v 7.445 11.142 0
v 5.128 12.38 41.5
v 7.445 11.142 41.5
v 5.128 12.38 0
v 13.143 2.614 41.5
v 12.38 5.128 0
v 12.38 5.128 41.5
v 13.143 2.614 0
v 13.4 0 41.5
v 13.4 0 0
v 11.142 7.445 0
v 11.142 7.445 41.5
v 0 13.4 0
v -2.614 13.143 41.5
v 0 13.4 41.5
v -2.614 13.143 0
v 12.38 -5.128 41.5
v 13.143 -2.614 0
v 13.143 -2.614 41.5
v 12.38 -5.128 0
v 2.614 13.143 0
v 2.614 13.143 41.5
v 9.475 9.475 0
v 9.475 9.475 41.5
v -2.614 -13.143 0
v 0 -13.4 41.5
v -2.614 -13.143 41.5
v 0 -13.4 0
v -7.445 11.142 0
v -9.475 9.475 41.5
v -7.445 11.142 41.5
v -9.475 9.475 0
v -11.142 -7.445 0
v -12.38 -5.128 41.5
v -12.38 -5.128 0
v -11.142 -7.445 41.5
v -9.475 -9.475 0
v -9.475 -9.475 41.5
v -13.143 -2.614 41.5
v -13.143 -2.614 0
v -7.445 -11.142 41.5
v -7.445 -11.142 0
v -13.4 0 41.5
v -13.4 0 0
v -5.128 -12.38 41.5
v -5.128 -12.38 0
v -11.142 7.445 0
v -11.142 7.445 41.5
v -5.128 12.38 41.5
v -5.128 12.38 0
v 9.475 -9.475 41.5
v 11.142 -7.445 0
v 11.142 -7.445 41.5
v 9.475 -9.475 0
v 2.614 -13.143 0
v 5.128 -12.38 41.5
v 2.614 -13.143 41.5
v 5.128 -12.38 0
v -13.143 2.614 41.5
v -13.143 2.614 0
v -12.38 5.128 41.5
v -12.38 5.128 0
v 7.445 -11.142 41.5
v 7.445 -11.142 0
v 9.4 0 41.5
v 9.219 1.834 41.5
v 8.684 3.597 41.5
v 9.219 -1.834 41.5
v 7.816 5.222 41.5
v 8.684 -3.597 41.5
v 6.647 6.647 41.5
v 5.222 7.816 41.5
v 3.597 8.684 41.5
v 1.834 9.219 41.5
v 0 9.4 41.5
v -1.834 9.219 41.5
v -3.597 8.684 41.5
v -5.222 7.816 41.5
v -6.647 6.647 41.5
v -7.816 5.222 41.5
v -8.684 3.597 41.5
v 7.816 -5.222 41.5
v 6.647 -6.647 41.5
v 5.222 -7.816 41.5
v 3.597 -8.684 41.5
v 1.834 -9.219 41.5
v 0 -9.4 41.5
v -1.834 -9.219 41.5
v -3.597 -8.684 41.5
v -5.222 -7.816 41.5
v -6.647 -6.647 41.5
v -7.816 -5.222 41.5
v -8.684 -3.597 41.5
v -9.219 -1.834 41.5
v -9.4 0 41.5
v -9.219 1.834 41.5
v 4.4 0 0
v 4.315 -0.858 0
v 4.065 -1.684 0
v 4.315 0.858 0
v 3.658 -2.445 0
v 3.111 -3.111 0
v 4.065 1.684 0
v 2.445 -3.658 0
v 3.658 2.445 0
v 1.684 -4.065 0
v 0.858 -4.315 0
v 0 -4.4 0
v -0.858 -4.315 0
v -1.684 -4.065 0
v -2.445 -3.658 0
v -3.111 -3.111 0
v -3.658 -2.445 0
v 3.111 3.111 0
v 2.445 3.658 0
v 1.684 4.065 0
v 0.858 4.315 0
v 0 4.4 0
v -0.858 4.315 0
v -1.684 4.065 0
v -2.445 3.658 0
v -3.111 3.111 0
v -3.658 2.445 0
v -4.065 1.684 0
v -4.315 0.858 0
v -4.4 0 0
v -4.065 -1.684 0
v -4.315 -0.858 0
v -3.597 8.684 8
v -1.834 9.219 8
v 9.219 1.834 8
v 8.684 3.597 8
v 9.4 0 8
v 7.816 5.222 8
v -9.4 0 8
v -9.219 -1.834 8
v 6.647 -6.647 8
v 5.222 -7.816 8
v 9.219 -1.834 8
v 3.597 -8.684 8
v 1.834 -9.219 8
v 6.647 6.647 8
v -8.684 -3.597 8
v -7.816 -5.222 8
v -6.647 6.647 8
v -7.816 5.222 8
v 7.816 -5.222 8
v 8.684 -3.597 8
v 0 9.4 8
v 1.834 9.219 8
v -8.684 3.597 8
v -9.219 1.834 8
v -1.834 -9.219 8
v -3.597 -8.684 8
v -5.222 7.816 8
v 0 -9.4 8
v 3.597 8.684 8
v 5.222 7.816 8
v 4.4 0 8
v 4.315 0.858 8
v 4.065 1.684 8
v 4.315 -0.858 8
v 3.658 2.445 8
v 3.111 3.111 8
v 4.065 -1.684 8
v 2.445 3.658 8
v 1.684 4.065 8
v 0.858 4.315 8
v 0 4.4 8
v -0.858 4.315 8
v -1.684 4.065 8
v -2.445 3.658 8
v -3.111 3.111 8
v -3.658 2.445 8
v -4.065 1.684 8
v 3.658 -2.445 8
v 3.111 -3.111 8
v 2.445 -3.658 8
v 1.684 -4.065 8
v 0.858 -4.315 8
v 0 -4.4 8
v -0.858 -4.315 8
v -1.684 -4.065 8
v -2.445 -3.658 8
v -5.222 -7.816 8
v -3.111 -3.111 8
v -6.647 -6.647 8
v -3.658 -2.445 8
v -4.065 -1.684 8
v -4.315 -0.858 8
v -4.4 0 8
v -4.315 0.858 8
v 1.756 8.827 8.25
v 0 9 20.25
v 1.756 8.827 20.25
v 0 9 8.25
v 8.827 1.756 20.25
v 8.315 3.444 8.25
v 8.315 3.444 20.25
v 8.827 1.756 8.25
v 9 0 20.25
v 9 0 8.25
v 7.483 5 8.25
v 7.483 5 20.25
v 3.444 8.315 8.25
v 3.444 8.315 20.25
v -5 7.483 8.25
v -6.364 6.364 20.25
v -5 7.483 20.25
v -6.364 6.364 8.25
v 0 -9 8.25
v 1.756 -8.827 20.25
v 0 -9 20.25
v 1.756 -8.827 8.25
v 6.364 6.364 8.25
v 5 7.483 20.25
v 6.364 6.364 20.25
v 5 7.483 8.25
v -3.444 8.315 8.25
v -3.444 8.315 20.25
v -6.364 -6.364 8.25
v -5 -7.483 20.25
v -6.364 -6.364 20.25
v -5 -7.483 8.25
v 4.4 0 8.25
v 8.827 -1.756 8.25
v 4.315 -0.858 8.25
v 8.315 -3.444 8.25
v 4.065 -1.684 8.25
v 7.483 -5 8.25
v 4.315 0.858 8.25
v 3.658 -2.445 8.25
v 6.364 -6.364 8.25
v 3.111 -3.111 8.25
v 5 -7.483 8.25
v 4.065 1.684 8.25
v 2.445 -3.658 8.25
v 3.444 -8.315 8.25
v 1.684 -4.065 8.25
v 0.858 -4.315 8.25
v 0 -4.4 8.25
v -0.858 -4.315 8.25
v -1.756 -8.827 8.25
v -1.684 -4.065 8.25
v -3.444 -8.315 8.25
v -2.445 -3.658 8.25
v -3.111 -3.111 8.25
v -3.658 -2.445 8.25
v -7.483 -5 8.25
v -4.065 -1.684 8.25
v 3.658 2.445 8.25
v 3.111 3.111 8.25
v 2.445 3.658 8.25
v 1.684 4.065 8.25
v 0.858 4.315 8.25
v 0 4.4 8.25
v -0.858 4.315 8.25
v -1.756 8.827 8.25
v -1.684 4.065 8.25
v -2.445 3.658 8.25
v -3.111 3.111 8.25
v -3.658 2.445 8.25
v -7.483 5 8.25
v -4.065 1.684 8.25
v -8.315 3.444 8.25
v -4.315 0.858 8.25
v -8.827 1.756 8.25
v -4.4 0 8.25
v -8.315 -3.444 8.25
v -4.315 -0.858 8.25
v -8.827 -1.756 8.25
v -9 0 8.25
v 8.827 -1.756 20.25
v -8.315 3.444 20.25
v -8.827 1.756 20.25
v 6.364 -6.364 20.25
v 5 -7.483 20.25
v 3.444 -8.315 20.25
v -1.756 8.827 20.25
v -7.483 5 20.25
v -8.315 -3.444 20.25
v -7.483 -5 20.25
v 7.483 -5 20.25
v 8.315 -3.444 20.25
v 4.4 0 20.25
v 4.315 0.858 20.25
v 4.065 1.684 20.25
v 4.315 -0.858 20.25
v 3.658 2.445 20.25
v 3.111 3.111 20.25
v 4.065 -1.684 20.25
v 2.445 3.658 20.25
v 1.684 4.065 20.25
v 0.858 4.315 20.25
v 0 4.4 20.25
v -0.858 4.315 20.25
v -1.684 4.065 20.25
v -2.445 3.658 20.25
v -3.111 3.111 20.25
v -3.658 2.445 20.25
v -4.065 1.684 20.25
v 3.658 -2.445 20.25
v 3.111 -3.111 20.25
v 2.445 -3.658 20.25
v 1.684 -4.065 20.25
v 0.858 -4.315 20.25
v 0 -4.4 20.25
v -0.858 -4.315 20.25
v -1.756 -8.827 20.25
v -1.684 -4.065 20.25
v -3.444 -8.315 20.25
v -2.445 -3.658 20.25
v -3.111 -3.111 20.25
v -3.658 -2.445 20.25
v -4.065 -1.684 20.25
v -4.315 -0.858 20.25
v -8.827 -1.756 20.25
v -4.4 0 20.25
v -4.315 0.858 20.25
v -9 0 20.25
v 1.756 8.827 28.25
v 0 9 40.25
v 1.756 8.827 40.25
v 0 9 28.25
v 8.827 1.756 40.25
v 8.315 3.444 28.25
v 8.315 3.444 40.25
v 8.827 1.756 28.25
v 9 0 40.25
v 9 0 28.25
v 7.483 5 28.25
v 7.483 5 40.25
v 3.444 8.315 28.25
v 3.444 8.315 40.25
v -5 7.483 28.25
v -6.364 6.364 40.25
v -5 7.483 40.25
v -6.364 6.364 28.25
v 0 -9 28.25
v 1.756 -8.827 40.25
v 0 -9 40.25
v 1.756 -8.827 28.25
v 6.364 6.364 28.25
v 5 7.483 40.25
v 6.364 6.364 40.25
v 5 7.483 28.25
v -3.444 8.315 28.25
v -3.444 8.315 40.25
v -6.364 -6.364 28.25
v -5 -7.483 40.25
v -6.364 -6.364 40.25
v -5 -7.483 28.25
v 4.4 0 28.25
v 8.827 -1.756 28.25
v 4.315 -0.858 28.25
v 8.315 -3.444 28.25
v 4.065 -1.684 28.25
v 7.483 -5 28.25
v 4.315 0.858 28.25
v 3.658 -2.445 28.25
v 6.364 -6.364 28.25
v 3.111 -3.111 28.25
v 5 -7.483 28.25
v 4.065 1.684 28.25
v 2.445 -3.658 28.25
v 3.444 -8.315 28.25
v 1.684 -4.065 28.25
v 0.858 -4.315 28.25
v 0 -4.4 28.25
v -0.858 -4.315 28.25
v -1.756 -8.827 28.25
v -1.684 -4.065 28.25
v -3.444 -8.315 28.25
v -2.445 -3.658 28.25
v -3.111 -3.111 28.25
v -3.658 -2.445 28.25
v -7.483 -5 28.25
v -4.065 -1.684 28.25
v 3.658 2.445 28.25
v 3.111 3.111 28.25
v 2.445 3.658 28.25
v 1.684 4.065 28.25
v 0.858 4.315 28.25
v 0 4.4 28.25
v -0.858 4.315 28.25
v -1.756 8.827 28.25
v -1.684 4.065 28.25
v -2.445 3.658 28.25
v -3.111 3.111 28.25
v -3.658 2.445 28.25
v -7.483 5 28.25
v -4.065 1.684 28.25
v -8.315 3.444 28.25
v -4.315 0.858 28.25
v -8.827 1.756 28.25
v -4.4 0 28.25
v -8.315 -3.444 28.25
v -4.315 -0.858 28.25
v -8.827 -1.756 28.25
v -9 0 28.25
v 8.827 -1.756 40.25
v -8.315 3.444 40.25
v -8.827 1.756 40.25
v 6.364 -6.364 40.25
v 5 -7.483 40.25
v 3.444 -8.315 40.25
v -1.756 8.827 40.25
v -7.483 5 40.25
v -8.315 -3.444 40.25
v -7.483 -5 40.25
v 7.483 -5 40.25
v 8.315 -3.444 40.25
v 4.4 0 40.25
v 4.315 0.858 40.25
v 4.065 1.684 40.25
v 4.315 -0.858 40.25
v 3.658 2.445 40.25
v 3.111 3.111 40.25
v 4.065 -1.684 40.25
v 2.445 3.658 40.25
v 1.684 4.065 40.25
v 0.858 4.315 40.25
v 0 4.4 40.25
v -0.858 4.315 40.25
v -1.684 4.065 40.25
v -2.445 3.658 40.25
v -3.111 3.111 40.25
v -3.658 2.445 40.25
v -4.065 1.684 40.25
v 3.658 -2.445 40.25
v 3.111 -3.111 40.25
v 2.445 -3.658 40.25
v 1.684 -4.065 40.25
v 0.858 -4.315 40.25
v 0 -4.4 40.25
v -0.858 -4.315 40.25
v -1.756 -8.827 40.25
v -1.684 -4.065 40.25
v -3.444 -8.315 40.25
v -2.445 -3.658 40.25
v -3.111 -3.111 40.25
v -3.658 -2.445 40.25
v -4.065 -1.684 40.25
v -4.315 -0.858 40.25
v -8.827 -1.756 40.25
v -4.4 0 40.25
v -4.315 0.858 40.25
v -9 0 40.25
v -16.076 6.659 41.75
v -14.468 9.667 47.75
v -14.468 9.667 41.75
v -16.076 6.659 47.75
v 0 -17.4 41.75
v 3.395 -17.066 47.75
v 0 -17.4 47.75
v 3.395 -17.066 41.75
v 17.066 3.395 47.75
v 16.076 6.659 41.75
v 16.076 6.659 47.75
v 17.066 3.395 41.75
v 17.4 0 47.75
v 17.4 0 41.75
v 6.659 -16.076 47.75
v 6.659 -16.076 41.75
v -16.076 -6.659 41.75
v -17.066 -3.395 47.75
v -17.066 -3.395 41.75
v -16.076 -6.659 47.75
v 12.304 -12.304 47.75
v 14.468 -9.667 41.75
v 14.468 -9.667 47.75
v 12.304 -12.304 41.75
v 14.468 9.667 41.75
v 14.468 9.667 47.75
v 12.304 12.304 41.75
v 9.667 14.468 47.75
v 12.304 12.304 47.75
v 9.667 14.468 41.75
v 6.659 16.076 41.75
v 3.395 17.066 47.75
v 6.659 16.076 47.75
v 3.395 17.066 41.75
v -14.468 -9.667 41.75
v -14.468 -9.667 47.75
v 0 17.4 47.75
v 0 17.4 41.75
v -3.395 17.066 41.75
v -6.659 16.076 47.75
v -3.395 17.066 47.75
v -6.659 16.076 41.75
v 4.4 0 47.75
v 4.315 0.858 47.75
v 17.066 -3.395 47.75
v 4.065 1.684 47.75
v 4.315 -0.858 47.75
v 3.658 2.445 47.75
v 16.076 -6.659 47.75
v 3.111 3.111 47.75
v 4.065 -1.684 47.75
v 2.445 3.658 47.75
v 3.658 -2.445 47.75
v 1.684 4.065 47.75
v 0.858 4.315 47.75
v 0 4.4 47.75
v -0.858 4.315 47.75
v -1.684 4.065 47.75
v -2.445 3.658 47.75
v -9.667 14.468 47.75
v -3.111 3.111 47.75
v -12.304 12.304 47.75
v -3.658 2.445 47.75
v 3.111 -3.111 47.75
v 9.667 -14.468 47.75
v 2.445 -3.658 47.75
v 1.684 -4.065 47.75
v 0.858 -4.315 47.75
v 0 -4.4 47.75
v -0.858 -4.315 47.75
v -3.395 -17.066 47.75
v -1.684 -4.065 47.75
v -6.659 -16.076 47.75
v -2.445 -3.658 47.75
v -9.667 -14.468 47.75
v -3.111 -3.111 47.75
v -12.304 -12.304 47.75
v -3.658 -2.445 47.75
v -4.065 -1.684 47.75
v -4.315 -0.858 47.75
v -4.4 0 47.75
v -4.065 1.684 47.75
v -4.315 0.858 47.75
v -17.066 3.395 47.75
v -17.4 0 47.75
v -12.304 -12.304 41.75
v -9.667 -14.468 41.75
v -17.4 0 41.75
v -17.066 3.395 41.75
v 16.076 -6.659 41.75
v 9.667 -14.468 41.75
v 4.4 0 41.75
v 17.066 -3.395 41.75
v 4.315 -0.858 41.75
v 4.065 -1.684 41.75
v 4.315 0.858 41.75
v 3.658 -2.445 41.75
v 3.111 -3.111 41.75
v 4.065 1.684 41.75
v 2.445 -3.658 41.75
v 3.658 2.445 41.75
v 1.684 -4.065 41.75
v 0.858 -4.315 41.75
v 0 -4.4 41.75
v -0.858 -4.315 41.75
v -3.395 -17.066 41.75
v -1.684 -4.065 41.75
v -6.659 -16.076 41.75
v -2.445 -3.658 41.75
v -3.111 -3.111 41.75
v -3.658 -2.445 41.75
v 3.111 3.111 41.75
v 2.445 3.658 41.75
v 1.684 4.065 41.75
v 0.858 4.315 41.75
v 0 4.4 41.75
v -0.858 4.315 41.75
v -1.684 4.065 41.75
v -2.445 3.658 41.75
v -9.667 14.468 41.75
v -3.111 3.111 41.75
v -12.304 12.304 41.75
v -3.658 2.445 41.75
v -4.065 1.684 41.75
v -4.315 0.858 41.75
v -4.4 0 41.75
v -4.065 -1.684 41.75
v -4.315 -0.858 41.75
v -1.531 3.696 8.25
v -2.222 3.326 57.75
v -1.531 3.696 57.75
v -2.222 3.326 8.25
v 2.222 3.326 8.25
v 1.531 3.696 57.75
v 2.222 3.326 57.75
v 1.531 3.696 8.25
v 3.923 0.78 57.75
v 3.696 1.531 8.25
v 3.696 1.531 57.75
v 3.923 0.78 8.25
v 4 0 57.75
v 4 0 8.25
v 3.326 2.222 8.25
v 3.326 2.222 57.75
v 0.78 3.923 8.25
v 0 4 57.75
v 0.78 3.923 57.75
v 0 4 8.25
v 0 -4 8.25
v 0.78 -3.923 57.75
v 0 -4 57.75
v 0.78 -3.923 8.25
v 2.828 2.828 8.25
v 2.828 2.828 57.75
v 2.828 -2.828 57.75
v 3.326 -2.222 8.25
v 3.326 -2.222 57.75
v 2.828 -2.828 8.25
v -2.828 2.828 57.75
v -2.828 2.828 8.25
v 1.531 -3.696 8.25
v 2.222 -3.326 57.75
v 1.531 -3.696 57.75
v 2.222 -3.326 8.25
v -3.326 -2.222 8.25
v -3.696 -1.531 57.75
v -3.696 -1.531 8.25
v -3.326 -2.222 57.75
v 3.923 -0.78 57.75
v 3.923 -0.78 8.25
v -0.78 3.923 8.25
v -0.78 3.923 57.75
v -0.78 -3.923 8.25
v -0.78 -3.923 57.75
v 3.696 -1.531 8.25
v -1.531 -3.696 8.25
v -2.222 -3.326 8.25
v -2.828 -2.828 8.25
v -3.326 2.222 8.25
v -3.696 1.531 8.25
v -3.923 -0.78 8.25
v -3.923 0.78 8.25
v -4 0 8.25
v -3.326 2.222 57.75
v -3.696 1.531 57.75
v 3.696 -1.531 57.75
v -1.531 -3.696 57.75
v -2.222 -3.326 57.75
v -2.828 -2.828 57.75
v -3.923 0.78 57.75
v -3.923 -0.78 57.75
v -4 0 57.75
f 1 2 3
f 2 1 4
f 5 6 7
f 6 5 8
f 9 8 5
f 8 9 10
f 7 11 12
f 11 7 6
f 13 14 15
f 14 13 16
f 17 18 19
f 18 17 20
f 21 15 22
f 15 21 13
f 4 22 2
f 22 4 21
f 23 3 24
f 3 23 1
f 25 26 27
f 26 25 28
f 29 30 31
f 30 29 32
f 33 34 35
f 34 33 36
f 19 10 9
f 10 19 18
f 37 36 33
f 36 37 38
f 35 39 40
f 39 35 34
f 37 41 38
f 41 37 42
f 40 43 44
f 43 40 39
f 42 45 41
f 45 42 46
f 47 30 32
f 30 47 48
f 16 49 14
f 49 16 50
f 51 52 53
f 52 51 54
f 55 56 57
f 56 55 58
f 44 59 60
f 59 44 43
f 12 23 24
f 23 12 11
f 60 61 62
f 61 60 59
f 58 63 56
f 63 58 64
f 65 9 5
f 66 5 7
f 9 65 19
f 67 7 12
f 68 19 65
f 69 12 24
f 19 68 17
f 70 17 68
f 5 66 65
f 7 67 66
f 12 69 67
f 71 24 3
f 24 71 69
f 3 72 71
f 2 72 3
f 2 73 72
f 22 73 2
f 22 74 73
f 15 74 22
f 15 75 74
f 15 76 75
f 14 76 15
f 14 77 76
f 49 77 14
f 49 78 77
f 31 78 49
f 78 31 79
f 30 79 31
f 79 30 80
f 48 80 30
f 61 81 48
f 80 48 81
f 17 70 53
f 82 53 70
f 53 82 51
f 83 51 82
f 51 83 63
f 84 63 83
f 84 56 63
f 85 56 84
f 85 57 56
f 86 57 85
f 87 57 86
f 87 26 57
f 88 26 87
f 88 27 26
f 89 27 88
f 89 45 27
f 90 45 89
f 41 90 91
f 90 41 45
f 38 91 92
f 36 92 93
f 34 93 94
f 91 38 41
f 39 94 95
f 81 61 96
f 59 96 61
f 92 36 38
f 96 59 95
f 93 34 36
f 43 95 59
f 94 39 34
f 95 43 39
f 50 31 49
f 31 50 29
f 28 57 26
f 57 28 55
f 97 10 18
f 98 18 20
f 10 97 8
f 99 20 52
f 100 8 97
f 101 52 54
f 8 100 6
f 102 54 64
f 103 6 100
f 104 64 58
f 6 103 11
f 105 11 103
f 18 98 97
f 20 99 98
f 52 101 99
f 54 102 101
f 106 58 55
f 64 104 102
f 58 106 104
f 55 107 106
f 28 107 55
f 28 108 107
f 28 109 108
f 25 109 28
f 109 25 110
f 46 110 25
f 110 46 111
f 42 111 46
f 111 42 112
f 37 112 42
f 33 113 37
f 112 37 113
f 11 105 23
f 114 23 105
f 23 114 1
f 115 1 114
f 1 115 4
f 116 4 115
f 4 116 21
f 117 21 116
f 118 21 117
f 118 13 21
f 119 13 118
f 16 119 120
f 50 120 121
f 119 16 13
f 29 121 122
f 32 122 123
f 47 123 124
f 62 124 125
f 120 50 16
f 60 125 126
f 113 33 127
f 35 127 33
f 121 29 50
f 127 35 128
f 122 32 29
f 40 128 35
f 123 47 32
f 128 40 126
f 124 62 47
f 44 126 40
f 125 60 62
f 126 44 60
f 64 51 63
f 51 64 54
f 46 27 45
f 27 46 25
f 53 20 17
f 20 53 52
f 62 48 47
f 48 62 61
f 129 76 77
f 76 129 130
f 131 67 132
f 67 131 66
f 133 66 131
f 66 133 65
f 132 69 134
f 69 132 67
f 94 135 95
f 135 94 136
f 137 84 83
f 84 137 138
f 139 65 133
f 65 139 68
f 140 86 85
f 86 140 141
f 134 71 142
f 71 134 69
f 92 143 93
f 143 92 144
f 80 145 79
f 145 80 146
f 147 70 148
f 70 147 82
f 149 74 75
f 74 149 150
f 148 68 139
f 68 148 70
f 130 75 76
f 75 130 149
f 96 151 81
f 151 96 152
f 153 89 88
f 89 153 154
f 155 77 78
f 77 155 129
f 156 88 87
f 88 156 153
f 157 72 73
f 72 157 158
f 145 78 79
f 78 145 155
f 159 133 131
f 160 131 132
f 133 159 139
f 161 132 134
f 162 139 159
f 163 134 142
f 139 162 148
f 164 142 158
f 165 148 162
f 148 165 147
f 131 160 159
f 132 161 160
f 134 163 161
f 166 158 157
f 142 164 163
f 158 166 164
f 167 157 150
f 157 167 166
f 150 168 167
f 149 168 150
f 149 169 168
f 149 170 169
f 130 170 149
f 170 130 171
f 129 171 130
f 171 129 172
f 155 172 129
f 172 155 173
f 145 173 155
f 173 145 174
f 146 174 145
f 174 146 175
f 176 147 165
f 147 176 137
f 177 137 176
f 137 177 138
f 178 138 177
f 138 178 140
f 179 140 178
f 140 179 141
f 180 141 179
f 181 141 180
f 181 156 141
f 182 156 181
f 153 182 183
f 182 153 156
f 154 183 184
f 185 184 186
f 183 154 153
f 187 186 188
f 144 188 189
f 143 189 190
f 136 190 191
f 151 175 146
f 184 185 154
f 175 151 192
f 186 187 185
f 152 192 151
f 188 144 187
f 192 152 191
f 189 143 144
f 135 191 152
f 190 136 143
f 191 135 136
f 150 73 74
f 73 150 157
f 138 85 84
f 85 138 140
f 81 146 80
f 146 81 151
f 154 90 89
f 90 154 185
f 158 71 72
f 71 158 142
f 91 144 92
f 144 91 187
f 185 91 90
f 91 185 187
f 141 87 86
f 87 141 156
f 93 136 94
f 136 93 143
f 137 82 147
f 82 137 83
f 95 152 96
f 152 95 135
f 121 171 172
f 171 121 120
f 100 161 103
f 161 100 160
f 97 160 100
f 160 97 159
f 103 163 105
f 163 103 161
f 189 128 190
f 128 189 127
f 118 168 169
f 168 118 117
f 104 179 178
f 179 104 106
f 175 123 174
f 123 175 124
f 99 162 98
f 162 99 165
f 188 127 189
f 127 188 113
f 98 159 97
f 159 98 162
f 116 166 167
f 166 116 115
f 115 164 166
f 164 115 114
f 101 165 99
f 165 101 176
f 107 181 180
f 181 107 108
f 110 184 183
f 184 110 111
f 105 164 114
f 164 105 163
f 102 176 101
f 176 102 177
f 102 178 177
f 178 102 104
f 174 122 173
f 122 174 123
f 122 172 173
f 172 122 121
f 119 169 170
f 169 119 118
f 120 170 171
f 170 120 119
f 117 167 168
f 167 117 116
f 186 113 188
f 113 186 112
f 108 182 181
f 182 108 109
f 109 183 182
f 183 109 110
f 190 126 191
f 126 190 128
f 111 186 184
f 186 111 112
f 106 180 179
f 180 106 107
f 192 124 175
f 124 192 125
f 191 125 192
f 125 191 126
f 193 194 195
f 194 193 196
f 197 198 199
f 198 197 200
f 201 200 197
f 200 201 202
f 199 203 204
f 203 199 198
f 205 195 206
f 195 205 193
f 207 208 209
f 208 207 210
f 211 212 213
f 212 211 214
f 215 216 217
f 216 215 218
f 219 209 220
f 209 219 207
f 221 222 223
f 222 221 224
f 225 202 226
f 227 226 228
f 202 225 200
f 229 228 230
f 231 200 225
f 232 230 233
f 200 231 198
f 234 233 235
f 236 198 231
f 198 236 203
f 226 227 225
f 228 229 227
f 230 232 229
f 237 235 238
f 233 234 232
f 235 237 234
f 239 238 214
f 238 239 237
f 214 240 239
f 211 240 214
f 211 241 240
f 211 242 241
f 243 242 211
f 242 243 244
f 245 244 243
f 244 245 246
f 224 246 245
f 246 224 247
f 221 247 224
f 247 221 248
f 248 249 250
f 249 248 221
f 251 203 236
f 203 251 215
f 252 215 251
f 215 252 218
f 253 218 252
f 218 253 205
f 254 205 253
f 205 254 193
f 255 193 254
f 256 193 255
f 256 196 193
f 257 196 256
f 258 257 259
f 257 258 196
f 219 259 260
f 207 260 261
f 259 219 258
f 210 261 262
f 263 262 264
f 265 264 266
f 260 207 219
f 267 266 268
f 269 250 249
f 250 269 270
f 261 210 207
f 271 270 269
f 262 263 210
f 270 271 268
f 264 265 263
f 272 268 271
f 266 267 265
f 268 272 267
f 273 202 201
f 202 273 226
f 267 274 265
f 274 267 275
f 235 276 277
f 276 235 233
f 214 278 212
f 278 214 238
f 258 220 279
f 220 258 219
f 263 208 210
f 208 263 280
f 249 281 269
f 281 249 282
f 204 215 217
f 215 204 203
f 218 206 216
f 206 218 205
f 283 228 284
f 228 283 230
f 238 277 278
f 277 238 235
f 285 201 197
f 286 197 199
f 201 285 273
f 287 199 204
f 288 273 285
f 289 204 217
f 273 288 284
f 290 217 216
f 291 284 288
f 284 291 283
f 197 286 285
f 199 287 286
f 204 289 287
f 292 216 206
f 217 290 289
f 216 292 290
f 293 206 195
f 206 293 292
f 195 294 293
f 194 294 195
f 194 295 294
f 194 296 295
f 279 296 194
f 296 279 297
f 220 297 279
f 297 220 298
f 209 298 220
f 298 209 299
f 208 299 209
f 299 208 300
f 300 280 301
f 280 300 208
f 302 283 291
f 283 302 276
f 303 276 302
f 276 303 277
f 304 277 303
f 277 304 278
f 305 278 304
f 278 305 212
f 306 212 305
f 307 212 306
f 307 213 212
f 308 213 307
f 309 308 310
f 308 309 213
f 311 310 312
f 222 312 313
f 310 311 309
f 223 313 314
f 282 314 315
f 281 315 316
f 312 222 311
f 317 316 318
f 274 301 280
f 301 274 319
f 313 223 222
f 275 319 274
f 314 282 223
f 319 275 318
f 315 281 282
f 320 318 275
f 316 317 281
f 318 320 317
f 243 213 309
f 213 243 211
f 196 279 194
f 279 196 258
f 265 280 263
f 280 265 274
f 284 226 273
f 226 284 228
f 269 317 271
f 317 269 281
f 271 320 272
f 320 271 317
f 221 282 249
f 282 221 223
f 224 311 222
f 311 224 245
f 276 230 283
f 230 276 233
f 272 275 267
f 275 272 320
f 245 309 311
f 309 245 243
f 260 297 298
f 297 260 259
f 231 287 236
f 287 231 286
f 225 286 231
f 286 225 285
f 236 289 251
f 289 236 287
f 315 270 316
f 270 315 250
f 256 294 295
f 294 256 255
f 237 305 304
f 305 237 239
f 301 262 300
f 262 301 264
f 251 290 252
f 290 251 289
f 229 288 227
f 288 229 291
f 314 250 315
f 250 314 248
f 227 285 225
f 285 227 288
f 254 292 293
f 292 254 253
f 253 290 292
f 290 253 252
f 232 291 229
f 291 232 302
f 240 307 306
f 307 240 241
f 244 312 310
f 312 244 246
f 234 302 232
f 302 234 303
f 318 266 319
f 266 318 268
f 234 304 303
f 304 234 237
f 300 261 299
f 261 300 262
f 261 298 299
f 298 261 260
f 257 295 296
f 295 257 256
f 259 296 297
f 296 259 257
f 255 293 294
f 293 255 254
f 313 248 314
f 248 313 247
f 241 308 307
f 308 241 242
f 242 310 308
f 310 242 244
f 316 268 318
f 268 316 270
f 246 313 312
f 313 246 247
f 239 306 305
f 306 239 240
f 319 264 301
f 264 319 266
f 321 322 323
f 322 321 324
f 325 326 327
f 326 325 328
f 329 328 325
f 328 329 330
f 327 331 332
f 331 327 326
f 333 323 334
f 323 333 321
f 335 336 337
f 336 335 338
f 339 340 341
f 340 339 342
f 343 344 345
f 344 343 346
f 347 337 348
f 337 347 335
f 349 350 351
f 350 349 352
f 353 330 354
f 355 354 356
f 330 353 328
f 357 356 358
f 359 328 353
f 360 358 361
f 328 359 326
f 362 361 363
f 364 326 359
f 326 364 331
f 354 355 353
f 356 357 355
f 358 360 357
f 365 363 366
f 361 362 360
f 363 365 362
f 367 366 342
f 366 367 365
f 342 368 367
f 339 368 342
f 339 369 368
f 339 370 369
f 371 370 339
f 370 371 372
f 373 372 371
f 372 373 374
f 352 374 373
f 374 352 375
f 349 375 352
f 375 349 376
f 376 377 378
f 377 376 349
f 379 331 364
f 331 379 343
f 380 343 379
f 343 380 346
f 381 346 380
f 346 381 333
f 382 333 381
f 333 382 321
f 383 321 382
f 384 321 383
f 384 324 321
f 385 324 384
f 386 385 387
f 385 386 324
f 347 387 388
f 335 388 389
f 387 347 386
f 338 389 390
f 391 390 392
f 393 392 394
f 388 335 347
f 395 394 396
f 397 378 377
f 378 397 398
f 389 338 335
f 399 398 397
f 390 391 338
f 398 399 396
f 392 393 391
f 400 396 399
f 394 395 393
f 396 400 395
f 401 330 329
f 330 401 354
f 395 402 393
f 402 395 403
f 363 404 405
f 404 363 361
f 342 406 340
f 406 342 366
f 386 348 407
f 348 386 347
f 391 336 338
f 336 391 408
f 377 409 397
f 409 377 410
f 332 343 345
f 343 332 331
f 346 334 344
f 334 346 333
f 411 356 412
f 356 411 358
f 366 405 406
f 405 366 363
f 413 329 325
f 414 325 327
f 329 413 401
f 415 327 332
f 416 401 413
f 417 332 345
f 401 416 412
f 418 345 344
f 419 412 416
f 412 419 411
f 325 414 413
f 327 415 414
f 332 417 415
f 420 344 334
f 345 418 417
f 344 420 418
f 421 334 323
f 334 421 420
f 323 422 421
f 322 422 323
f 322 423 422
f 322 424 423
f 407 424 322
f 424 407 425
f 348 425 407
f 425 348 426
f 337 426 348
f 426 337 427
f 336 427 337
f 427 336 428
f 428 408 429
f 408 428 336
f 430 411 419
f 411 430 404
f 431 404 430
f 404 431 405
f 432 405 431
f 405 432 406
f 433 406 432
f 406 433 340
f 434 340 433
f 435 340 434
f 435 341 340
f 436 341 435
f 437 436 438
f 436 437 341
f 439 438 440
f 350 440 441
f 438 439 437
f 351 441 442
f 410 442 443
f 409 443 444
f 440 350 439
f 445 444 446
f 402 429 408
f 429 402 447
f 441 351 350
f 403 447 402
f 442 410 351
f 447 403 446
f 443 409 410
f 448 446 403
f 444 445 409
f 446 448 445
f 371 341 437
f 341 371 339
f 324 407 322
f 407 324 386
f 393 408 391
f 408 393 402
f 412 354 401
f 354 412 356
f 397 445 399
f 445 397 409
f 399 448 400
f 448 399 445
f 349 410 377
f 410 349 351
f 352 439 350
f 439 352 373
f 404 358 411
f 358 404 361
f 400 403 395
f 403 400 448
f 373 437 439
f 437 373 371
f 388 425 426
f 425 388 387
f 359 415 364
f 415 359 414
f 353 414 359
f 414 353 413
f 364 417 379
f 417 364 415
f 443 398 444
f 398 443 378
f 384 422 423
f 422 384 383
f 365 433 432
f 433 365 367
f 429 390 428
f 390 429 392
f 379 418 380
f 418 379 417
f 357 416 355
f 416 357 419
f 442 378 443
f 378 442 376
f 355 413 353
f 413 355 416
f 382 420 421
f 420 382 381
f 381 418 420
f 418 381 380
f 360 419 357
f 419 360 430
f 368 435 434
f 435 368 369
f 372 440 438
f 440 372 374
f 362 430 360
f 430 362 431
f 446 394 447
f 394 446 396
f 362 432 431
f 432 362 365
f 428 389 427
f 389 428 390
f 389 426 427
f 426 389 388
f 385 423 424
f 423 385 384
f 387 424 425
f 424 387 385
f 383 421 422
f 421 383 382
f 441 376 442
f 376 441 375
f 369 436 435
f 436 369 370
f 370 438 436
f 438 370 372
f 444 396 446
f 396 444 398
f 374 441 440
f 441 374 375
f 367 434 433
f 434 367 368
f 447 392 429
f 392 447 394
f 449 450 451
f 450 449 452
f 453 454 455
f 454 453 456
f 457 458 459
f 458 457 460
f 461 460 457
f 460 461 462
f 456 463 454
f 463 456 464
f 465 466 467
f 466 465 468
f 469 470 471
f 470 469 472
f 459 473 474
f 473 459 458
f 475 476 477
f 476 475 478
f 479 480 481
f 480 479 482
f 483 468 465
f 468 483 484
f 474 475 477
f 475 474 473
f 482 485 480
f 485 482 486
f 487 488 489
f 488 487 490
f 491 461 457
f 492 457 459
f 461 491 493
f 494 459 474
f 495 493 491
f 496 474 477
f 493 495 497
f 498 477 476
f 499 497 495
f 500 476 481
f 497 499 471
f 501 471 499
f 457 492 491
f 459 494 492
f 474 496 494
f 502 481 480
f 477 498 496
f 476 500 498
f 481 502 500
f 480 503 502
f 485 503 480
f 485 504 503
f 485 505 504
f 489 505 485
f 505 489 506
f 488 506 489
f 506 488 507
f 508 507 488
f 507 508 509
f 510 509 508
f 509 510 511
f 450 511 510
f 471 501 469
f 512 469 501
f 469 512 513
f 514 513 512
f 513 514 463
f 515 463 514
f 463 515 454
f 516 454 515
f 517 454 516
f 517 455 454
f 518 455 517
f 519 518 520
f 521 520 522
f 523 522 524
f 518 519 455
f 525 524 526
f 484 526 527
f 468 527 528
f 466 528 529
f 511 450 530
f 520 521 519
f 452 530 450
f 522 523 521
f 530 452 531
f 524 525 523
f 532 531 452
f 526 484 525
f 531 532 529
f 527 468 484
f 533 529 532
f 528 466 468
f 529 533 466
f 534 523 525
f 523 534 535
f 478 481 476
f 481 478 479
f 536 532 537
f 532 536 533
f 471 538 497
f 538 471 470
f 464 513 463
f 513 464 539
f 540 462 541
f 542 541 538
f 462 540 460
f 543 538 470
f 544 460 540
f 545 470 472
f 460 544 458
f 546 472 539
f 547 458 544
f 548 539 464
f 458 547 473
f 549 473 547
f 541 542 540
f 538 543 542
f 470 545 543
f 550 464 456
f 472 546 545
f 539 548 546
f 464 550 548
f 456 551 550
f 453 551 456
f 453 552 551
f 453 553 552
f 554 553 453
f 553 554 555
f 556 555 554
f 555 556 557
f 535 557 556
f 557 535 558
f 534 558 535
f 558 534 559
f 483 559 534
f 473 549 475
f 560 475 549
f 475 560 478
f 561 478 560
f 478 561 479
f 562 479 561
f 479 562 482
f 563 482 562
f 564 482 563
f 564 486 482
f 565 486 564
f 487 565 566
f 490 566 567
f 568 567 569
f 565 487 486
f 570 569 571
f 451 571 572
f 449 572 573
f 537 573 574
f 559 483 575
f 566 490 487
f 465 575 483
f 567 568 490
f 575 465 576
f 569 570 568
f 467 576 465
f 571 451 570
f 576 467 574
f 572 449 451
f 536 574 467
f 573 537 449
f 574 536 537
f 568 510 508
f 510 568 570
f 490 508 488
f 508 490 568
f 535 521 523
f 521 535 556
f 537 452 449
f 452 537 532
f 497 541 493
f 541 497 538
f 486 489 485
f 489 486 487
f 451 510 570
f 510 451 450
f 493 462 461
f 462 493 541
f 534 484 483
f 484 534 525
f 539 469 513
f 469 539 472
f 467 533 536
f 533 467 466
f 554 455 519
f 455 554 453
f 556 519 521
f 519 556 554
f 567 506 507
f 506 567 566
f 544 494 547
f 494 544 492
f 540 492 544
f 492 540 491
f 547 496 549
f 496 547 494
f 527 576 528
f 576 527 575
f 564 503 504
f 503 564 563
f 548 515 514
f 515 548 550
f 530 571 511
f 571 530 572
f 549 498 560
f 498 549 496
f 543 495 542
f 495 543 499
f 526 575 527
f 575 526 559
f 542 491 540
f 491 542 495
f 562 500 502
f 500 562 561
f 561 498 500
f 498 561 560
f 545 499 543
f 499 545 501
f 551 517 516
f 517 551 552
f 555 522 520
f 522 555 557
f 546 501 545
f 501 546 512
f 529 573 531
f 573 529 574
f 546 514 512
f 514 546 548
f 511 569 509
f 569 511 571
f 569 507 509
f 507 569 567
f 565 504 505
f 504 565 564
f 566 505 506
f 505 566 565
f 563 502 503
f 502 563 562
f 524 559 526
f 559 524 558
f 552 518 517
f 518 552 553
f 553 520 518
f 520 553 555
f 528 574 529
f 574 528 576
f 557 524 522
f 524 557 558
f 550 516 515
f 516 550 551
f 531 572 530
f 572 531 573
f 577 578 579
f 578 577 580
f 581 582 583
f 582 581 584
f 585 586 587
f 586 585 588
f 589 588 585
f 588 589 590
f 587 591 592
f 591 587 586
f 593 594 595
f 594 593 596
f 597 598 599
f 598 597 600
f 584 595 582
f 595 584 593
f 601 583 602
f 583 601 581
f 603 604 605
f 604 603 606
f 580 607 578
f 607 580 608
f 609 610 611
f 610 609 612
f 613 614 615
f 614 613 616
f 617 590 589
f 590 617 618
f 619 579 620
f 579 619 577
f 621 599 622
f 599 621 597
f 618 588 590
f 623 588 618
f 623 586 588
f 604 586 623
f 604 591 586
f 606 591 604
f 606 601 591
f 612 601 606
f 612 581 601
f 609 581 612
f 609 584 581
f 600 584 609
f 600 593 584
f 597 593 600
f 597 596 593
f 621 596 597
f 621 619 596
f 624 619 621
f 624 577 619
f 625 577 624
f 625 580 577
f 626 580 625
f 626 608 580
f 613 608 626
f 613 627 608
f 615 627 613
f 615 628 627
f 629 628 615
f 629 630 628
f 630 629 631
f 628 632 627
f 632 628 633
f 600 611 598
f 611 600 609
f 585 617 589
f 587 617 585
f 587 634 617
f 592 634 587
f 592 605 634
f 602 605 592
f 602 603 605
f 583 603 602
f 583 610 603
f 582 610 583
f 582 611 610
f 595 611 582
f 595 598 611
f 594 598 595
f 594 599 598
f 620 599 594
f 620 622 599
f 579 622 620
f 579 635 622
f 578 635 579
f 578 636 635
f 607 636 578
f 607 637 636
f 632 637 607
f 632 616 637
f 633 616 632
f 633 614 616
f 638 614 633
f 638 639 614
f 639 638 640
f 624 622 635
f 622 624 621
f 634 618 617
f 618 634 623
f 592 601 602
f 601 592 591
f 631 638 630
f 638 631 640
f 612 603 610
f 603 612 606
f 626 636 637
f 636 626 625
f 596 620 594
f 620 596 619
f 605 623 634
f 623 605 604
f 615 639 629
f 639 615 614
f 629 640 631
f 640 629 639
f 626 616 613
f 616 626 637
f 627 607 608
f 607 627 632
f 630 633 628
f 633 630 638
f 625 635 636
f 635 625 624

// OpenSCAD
$fn = 32;

// ------------------------------------------------------------------------
// Shaft station: cup d26.8 x 41.5 mm, shaft d8
// Every part is its own module, assembly() places every instance.
// ------------------------------------------------------------------------

// --- part 1 ---
module housing_cup() {
  difference() {
    cylinder(h = 41.5, d = 26.8);
    translate([0, 0, 8]) cylinder(h = 34.5, d = 18.8);
    translate([0, 0, -1]) cylinder(h = 10, d = 8.8);
  }
}

// --- part 2 ---
module bearing_lower() {
  difference() {
      translate([0, 0, 0]) cylinder(h = 12, d = 18);
      translate([0, 0, -1]) cylinder(h = 14, d = 8.8);
    }
}

// --- part 3 ---
module bearing_upper() {
  difference() {
      translate([0, 0, 0]) cylinder(h = 12, d = 18);
      translate([0, 0, -1]) cylinder(h = 14, d = 8.8);
    }
}

// --- part 4 ---
module station_shaft() {
  translate([0, 0, -24.75]) cylinder(h = 49.5, d = 8);
}

// --- part 5 ---
module station_cover() {
  difference() {
    cylinder(h = 6, d = 34.8);
    translate([0, 0, -1]) cylinder(h = 8, d = 8.8);
  }
}

// --- assembly ---
module assembly() {
  color([0.80, 0.24, 0.20]) translate([0, 0, 0]) rotate([0, 0, 0]) housing_cup();
  color([0.20, 0.45, 0.75]) translate([0, 0, 8.25]) rotate([0, 0, 0]) bearing_lower();
  color([0.25, 0.62, 0.32]) translate([0, 0, 28.25]) rotate([0, 0, 0]) bearing_upper();
  color([0.92, 0.70, 0.18]) translate([0, 0, 33]) rotate([0, 0, 0]) station_shaft();
  color([0.58, 0.35, 0.70]) translate([0, 0, 41.75]) rotate([0, 0, 0]) station_cover();
}

assembly();
